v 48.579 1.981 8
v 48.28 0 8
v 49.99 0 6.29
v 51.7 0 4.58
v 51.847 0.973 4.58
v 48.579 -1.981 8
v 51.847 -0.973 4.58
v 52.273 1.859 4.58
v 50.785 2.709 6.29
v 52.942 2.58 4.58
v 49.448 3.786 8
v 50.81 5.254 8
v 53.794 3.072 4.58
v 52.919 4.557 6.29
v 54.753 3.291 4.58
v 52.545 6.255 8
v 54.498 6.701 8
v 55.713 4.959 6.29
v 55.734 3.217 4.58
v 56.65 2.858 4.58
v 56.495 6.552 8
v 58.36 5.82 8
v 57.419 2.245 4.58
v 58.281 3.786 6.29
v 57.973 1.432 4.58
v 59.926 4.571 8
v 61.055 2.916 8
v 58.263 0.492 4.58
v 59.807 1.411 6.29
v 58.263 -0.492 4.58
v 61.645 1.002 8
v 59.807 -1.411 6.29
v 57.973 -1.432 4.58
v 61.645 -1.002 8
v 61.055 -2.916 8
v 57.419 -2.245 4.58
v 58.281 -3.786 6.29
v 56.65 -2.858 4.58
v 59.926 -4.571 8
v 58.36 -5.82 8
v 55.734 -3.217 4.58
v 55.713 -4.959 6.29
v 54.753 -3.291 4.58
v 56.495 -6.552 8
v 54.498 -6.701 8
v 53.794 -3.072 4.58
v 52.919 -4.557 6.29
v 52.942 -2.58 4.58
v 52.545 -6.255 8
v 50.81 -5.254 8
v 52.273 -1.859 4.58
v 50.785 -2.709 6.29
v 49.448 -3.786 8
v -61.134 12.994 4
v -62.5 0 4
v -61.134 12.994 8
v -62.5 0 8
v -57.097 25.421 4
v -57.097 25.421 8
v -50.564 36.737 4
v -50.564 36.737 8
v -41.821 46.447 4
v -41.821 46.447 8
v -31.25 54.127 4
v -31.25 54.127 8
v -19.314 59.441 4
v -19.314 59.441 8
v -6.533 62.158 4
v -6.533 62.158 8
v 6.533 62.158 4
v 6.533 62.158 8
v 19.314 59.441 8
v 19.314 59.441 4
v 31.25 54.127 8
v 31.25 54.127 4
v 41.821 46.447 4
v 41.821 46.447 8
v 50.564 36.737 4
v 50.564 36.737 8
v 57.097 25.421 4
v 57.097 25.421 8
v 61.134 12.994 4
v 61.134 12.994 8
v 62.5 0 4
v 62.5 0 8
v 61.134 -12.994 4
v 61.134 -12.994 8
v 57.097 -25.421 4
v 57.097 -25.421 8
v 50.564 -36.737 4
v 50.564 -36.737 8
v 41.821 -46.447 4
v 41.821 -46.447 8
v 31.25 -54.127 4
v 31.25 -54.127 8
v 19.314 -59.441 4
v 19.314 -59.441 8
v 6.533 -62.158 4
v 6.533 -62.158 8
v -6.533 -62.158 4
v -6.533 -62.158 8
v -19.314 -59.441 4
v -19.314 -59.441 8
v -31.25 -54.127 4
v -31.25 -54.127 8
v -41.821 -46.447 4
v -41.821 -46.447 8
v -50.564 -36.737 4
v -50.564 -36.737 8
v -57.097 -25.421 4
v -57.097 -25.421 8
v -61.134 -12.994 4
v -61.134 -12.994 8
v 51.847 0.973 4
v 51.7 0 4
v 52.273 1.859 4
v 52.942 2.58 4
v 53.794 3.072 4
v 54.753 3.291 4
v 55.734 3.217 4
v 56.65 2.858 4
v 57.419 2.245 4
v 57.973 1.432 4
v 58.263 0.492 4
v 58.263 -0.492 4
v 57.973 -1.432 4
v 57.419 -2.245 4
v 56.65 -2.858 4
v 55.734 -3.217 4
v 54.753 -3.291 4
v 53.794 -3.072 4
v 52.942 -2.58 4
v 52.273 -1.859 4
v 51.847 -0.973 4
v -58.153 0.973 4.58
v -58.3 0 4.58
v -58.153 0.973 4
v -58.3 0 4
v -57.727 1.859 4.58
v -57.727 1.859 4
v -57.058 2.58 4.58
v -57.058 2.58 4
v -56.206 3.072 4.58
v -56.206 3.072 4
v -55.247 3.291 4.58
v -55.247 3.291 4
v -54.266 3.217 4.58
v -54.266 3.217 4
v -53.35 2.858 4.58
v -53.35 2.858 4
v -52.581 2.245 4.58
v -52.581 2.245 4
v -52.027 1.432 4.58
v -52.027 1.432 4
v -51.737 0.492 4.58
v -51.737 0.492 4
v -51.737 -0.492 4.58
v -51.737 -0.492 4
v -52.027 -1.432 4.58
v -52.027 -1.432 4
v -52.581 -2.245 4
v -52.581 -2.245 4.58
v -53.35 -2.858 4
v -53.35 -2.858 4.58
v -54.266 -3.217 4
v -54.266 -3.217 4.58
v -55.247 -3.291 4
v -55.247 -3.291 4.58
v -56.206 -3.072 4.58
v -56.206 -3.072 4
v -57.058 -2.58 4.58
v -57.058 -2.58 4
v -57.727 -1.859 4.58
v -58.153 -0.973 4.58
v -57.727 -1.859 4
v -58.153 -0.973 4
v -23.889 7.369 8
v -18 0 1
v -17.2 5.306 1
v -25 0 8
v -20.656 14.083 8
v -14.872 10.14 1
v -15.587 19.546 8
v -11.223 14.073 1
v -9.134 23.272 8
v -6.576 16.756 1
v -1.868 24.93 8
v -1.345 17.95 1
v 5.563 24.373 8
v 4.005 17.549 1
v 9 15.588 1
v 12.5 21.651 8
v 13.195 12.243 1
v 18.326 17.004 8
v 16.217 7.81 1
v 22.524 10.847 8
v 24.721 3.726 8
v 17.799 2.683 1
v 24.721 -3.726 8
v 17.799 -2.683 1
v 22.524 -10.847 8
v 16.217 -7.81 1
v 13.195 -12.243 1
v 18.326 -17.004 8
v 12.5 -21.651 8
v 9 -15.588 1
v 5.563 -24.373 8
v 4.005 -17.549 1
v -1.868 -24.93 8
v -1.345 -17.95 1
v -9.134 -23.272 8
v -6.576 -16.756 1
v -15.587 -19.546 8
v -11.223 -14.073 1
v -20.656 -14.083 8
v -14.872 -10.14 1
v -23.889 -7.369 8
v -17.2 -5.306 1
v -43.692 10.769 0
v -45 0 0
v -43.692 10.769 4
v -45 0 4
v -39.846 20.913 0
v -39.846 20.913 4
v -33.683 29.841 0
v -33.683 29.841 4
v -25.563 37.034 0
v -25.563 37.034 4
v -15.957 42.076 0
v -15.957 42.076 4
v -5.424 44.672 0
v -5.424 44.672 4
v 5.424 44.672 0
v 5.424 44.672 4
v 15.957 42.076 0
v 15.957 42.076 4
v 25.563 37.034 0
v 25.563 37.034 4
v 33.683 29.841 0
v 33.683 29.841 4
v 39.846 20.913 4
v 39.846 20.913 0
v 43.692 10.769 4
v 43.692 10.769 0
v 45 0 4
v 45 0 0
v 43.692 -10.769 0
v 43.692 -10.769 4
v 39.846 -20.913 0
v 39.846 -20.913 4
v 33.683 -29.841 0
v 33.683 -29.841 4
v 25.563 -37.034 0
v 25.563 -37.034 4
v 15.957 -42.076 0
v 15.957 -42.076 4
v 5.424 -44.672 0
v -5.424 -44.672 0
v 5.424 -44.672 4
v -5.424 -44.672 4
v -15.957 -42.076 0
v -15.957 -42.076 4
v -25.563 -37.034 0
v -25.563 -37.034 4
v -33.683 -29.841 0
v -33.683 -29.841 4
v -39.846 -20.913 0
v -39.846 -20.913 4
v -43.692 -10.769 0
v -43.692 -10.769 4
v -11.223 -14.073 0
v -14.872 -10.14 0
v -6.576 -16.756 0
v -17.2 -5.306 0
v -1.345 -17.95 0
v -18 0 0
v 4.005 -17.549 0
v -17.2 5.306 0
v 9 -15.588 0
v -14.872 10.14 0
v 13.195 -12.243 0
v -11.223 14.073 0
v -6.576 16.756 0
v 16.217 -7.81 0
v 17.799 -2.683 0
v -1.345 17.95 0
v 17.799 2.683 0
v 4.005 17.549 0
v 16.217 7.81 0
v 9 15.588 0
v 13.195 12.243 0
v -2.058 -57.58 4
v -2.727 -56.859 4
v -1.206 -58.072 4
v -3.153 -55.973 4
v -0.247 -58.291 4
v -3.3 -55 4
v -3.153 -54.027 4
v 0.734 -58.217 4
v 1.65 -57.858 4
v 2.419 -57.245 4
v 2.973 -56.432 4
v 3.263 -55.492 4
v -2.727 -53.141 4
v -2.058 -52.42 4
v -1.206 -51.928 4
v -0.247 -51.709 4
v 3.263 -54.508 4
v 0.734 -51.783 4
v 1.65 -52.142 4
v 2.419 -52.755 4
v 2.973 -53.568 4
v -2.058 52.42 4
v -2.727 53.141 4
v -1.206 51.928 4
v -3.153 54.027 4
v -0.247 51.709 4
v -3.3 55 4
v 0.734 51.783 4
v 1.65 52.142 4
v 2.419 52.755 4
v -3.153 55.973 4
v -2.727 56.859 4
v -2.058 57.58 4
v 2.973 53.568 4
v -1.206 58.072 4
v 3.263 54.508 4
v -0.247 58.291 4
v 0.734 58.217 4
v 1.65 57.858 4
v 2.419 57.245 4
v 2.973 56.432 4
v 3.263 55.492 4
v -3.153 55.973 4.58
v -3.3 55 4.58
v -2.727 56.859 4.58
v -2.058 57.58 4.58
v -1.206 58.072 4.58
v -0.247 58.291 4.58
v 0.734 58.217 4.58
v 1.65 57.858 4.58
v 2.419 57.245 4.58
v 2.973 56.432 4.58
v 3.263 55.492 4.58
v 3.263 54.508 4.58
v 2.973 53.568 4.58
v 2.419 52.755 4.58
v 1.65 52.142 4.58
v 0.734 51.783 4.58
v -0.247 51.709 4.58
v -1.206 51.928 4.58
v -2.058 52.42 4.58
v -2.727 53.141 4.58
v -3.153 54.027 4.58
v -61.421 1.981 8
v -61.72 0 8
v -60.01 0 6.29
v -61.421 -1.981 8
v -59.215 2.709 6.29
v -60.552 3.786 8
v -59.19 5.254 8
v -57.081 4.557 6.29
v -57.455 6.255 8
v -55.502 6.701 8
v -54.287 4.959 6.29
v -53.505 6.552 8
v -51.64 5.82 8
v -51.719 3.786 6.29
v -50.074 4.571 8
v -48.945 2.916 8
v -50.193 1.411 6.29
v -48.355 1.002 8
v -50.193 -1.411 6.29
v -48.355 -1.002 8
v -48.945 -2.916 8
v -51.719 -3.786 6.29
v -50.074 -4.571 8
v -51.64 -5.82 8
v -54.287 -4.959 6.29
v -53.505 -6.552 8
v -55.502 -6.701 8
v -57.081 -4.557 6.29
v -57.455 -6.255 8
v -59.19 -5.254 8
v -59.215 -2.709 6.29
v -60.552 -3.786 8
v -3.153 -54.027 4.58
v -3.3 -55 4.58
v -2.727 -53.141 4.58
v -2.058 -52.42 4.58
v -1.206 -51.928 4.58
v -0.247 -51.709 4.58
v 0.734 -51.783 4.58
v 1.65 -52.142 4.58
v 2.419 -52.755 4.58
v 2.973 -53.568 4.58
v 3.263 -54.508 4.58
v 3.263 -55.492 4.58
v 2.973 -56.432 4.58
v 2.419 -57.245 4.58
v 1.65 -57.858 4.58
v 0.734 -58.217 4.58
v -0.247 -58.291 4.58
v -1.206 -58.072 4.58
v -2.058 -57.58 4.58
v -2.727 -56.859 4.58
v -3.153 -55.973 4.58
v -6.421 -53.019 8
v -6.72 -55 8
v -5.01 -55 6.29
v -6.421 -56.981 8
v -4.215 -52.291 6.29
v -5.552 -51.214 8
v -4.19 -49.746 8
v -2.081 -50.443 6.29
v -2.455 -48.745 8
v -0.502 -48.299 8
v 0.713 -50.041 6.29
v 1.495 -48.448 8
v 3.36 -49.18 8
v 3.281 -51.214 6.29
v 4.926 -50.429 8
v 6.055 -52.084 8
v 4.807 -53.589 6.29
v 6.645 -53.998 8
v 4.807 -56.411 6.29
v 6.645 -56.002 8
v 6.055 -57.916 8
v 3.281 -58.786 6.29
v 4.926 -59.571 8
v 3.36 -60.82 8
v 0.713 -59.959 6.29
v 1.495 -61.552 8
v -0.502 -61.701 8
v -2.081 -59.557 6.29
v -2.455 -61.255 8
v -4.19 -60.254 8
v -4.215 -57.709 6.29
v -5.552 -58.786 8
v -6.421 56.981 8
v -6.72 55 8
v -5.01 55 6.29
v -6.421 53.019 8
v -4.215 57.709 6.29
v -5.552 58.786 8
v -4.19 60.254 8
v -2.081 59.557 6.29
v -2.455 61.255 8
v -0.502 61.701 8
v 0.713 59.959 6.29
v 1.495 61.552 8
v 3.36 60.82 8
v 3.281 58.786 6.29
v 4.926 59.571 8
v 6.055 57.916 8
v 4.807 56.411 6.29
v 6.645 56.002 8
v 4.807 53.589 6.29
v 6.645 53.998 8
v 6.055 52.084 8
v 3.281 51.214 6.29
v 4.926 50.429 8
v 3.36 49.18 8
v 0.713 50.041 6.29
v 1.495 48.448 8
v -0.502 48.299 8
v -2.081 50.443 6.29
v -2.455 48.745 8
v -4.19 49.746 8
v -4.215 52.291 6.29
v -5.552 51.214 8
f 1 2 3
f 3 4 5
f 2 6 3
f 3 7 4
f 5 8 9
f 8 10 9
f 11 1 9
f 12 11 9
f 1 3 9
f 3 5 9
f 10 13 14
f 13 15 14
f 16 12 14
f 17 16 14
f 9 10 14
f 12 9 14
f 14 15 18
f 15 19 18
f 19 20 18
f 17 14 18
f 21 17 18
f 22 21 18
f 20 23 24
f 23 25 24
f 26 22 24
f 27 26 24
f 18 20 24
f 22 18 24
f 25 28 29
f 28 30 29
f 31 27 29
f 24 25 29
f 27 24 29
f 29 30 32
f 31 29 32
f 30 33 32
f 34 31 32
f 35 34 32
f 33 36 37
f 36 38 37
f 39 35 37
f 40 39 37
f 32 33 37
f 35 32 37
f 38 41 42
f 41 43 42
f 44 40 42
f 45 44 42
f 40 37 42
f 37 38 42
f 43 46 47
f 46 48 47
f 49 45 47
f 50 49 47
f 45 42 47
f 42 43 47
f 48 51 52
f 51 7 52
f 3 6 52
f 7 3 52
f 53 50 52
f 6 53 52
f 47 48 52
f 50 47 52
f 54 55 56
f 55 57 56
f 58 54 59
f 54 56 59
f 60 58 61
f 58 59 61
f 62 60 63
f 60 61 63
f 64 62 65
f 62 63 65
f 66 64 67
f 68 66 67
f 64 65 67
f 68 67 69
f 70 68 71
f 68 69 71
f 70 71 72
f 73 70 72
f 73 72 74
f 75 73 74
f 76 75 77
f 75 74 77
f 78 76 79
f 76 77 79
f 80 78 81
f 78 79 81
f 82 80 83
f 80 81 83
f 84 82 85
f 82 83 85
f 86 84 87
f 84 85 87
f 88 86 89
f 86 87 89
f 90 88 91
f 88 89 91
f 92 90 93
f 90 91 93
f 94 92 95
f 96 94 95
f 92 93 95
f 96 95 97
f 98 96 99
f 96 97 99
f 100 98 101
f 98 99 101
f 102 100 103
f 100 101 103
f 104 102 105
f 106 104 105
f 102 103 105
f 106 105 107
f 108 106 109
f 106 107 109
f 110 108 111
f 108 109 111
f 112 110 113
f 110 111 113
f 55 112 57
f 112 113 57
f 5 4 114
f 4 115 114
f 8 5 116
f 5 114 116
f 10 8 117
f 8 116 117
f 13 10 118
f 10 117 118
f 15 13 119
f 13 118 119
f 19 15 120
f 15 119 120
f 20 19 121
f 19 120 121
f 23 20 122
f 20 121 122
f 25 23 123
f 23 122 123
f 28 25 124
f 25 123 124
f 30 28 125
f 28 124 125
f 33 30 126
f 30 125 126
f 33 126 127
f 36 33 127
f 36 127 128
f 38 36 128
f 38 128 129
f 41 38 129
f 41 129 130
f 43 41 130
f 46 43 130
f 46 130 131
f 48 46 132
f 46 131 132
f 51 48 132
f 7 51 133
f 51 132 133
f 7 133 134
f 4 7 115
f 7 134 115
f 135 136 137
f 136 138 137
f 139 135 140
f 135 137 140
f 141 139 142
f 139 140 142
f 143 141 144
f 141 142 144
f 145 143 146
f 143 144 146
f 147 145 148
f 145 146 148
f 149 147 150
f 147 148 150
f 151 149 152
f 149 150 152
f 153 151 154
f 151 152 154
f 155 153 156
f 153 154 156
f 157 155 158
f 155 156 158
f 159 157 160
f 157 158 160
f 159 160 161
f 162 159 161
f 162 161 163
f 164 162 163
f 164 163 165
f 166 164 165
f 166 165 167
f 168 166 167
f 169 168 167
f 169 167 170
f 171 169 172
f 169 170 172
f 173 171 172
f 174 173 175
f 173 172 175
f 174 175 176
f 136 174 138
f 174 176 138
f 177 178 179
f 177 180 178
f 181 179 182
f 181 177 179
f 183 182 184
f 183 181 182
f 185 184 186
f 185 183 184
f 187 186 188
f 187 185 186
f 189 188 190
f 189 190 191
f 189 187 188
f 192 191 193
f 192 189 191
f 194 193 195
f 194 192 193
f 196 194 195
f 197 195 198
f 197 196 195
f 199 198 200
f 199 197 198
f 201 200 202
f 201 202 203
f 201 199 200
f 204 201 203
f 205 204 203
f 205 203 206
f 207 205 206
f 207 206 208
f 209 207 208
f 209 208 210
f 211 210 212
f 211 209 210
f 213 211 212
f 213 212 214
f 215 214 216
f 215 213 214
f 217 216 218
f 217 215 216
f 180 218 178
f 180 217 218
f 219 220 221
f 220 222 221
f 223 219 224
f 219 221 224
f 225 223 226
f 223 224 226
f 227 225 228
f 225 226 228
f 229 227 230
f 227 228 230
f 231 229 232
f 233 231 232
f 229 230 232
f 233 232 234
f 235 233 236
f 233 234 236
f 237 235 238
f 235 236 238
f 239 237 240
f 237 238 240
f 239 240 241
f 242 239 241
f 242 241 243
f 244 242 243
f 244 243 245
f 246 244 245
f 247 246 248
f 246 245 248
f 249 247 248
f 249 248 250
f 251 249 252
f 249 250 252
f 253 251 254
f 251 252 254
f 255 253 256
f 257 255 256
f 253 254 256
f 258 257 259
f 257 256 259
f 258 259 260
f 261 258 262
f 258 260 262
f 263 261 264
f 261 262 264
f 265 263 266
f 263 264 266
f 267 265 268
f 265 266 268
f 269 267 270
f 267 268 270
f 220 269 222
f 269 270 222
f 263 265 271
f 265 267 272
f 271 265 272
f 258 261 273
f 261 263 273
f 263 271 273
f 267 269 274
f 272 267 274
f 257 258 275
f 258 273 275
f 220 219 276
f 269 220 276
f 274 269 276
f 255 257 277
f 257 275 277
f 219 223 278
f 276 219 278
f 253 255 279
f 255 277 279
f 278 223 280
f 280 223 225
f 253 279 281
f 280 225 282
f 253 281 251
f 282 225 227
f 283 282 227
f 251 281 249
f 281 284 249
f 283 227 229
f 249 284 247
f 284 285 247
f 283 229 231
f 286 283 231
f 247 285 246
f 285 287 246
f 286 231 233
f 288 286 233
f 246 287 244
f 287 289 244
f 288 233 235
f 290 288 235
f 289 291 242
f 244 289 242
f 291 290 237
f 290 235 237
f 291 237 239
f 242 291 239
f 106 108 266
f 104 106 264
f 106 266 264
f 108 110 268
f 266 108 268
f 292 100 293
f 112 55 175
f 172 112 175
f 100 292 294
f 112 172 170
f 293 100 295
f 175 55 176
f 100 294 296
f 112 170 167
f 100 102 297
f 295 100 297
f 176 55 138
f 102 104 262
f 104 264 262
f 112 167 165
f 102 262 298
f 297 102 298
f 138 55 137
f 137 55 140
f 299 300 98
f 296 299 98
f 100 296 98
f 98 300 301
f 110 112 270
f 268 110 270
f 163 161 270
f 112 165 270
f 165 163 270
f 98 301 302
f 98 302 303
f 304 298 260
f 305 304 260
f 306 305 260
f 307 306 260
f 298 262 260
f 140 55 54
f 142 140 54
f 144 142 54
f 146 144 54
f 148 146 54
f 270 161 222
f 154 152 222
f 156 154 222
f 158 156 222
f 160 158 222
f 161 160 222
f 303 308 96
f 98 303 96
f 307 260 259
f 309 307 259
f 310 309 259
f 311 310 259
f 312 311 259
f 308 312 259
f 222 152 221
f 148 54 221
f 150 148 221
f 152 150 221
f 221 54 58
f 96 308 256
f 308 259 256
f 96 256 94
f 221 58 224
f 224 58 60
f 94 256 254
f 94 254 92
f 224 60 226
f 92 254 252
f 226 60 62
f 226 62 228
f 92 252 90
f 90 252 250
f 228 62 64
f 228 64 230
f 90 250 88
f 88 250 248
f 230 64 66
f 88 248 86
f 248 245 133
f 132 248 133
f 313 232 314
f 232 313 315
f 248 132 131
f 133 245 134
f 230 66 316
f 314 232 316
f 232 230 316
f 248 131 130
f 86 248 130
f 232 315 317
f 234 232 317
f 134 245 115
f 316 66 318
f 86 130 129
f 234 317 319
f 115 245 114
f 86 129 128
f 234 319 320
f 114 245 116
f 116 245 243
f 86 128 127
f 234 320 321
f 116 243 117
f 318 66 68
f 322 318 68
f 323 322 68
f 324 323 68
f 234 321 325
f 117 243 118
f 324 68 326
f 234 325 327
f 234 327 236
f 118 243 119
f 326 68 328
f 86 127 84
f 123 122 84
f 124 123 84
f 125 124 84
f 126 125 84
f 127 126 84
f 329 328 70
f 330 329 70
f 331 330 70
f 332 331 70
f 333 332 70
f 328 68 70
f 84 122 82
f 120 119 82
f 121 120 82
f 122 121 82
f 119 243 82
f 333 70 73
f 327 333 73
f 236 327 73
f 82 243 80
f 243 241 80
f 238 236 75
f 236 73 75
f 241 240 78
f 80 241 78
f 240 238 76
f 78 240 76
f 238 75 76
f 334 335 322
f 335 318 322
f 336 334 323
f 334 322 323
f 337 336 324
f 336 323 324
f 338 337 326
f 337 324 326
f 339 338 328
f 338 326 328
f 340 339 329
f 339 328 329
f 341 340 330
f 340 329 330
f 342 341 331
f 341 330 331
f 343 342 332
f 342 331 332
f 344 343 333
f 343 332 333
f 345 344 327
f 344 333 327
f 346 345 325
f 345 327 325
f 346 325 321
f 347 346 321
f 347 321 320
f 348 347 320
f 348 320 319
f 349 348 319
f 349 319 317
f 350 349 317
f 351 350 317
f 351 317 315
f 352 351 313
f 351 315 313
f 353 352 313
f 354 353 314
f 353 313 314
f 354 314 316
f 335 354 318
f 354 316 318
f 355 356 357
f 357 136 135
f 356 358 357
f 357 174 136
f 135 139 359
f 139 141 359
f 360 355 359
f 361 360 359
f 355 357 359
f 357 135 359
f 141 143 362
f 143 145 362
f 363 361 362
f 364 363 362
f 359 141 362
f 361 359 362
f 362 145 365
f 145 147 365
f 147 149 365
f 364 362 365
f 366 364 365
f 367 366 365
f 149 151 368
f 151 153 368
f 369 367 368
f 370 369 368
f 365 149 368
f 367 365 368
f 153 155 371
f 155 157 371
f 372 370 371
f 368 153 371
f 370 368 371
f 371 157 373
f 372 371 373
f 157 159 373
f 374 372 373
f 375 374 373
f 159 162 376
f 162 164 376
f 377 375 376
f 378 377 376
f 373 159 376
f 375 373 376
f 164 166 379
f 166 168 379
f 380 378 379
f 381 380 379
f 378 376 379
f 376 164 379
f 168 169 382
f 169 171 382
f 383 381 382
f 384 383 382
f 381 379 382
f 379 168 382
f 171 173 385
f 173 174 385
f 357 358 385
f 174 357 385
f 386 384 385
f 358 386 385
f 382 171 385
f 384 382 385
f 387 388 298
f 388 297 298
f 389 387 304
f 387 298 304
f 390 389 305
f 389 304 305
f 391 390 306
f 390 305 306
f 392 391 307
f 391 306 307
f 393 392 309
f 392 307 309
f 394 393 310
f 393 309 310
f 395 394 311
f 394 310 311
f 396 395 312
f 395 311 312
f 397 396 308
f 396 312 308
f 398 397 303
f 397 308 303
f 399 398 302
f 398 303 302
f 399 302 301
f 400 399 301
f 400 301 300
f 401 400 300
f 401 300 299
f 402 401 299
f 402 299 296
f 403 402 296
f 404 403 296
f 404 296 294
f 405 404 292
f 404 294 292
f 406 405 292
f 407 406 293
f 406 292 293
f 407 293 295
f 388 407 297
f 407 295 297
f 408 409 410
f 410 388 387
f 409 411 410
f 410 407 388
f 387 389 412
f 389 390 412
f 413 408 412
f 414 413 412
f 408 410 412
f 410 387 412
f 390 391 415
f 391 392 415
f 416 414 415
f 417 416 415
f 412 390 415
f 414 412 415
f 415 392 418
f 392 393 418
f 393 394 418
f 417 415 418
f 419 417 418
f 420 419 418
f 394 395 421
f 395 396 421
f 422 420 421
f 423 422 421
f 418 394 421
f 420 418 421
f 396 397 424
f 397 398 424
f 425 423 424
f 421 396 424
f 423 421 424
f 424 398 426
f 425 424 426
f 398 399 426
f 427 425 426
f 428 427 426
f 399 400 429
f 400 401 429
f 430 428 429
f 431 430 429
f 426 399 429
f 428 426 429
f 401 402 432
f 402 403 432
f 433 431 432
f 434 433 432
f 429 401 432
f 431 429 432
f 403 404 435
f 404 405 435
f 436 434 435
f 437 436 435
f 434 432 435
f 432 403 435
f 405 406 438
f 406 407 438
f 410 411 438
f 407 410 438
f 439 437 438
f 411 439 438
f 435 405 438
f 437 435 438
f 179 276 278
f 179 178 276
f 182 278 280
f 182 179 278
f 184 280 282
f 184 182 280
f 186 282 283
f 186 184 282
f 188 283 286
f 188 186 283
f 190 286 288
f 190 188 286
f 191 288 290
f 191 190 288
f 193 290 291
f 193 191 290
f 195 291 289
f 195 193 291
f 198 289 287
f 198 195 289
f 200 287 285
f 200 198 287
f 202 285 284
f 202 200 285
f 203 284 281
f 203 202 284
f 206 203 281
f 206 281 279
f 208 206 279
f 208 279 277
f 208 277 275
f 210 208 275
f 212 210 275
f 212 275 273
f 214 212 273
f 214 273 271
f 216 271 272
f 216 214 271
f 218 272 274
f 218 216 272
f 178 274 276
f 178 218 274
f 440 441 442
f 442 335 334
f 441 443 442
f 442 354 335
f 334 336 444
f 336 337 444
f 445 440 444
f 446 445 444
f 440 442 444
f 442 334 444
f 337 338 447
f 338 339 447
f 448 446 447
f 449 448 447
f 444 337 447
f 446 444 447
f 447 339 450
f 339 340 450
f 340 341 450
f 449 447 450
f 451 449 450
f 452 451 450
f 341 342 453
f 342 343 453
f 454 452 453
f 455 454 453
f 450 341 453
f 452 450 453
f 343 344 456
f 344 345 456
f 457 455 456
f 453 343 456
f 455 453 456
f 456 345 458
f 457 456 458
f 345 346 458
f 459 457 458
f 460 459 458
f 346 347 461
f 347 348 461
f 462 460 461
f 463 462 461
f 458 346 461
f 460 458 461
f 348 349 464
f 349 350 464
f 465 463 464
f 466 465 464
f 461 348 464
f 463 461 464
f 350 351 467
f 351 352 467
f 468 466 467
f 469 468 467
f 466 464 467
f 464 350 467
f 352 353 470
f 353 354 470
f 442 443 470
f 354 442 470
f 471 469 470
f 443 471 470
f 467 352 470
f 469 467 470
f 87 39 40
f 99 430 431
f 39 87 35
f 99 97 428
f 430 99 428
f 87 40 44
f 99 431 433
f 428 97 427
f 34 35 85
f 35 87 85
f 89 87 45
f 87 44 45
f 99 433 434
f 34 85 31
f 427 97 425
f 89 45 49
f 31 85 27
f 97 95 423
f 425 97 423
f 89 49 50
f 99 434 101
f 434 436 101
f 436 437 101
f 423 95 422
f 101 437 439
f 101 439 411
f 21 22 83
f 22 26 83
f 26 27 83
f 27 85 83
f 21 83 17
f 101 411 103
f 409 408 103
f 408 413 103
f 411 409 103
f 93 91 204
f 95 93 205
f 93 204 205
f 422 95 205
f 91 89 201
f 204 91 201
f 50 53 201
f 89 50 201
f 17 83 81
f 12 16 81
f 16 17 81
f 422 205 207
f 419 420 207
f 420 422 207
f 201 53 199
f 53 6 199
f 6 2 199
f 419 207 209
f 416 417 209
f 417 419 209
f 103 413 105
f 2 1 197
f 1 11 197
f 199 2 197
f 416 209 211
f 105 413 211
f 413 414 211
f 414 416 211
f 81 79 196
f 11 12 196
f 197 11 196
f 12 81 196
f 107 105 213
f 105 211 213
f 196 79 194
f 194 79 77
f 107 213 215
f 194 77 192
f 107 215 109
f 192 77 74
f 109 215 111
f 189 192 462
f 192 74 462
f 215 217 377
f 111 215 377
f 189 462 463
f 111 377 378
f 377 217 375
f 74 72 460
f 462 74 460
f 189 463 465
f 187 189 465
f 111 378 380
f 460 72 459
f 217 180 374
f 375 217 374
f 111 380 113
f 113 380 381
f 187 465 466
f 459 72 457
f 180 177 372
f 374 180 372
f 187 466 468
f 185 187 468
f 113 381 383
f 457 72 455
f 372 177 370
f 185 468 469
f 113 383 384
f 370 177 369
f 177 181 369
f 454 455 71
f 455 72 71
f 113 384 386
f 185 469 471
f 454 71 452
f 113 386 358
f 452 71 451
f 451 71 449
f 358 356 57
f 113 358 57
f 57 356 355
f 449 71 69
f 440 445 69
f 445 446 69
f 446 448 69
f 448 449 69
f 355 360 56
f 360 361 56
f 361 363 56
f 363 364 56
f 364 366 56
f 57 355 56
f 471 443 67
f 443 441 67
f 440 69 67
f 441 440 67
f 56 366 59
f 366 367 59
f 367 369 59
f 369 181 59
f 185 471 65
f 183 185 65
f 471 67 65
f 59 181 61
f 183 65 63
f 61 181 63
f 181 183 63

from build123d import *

# Parameters (mm, degrees)
POG_BIENIE_STO_KOWE_POD_M6_WKR_T_Z_BEM_D           = 6.6
POG_BIENIE_STO_KOWE_POD_M6_WKR_T_Z_BEM_DEPTH       = 30
POG_BIENIE_STO_KOWE_POD_M6_WKR_T_Z_BEM_CSINK_D     = 13.44
POG_BIENIE_STO_KOWE_POD_M6_WKR_T_Z_BEM_CSINK_ANGLE = 90
POG_BIENIE_STO_KOWE_POD_M6_WKR_T_Z_BEM_TIP         = 1.982840043


with BuildPart() as part:
    # Szkic2 → Obrót1 (revolve)
    with BuildSketch(Plane(origin=(0, 0, 0), x_dir=(1, 0, 0), z_dir=(0, 1, 0))):
        Polygon((0, 0), (45, 0), (45, -4), (62.5, -4), (62.5, -8), (0, -8), align=None)
    revolve(axis=Axis((0, 0, 8), (0, 0, -1)))

    # Szkic1 → Wycięcie-obrót1 (revolve, cut)
    with BuildSketch(Plane(origin=(0, 0, 0), x_dir=(1, 0, 0), z_dir=(0, 1, 0))):
        Polygon((0, 0), (18, 0), (18, -1), (25, -8), (0, -8), align=None)
    revolve(axis=Axis((0, 0, 8), (0, 0, -1)), mode=Mode.SUBTRACT)

    # Pogłębienie stożkowe pod M6 Wkręt z łbem stożkowym płaskim1
    with Locations(Plane(origin=(-55, 0, 8), x_dir=(1, 0, 0), z_dir=(0, 0, 1))):
        with Locations((0, 0), (55, 55), (110, 0), (55, -55)):
            CounterSinkHole(POG_BIENIE_STO_KOWE_POD_M6_WKR_T_Z_BEM_D / 2, POG_BIENIE_STO_KOWE_POD_M6_WKR_T_Z_BEM_CSINK_D / 2, depth=POG_BIENIE_STO_KOWE_POD_M6_WKR_T_Z_BEM_DEPTH, counter_sink_angle=POG_BIENIE_STO_KOWE_POD_M6_WKR_T_Z_BEM_CSINK_ANGLE)
            with Locations((0, 0, -(POG_BIENIE_STO_KOWE_POD_M6_WKR_T_Z_BEM_DEPTH + POG_BIENIE_STO_KOWE_POD_M6_WKR_T_Z_BEM_TIP / 2))):  # 118° drill point
                Cone(0, POG_BIENIE_STO_KOWE_POD_M6_WKR_T_Z_BEM_D / 2, POG_BIENIE_STO_KOWE_POD_M6_WKR_T_Z_BEM_TIP, mode=Mode.SUBTRACT)


solid = part.part
